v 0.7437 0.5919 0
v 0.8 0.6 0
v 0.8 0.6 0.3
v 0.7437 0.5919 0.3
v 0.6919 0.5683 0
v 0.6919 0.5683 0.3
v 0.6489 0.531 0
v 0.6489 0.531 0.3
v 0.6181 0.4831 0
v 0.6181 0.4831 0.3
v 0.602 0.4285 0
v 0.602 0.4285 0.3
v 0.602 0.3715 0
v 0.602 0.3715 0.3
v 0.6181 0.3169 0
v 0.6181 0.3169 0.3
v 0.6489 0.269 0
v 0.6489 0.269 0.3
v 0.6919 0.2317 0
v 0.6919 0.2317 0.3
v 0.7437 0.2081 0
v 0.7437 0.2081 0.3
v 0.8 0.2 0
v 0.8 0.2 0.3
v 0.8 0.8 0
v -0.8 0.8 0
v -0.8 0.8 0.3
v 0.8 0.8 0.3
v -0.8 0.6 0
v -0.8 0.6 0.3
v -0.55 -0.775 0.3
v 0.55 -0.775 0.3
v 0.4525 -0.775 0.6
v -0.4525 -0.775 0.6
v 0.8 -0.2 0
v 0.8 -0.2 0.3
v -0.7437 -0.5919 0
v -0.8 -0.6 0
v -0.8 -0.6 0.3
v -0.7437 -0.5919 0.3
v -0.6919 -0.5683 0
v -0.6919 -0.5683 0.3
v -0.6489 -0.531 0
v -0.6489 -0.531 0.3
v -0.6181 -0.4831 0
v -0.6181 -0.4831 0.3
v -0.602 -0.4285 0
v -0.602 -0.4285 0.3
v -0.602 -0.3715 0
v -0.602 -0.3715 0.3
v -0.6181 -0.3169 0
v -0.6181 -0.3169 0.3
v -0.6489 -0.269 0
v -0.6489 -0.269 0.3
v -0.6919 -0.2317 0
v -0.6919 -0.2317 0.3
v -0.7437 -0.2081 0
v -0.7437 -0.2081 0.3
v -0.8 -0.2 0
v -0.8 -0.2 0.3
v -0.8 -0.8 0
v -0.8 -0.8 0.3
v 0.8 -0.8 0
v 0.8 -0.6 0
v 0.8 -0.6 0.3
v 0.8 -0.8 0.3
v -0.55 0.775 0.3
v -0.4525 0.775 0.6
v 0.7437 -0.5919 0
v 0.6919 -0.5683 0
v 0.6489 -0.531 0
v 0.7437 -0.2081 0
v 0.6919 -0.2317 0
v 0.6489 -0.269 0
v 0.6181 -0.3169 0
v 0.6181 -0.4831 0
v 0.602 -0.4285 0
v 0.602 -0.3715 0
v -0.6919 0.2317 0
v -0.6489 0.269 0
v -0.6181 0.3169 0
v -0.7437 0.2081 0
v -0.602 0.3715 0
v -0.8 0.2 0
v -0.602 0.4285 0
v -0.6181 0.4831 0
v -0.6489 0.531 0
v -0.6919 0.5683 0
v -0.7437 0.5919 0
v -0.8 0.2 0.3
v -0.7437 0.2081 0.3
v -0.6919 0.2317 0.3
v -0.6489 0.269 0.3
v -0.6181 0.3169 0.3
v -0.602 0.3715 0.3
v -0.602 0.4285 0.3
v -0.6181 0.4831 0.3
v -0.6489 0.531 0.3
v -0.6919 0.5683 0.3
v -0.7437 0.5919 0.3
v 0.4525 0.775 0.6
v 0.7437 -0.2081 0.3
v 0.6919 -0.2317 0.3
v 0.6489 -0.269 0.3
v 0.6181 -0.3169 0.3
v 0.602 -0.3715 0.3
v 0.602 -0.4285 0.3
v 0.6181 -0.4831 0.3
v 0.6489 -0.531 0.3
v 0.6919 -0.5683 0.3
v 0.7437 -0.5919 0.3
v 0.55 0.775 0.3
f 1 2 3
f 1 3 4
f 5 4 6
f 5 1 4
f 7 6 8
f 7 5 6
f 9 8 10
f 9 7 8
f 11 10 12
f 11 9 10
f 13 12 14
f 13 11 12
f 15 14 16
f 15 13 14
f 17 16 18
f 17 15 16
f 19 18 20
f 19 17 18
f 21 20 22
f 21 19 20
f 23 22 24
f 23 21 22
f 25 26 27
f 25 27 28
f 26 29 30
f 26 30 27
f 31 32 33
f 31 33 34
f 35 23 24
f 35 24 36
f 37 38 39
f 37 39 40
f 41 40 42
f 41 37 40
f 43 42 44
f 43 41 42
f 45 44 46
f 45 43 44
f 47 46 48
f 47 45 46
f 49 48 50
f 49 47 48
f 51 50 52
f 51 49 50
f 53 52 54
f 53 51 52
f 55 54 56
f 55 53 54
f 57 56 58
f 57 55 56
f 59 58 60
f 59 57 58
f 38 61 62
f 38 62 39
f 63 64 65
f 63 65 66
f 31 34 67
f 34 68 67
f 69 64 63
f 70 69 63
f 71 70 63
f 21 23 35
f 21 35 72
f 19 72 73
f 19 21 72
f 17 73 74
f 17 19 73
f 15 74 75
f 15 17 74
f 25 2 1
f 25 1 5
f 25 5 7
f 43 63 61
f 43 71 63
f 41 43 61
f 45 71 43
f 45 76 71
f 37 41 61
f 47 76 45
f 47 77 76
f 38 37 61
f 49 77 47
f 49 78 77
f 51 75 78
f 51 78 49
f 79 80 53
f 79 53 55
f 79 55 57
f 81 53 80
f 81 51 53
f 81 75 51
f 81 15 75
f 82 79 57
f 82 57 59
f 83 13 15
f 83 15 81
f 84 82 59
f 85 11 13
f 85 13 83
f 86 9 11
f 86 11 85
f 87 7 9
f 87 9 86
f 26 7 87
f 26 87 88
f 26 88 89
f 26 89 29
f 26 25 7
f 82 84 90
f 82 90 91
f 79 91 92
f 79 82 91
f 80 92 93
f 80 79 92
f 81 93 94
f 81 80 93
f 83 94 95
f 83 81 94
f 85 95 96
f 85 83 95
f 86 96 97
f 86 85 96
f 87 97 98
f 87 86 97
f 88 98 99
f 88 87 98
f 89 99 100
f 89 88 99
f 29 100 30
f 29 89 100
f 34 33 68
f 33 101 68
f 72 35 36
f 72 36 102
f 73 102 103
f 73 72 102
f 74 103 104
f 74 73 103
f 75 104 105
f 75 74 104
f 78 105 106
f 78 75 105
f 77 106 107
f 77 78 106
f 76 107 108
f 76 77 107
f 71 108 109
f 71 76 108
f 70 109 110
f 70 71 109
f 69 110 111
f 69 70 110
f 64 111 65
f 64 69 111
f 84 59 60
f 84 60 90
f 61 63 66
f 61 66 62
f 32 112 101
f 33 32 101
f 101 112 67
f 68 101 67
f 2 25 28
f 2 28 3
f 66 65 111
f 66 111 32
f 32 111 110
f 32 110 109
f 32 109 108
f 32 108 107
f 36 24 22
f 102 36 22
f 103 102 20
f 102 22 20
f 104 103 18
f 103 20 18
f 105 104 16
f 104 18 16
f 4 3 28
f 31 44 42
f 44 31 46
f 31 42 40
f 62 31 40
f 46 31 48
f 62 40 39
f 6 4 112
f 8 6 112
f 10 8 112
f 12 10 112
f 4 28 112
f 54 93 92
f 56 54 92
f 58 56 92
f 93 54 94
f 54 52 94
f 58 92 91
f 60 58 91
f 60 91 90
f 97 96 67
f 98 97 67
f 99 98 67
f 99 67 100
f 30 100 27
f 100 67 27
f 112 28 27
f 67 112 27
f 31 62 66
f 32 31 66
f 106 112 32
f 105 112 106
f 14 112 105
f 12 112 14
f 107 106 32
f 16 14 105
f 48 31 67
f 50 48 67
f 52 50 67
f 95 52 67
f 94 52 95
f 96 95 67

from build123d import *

# Parameters (mm, degrees)
BOSS_EXTRUDE1_DEPTH = 0.3
BOSS_EXTRUDE2_DEPTH = 0.775


with BuildPart() as part:
    # Sketch2 → Boss-Extrude1 (new body)
    with BuildSketch(Plane.XY):
        with BuildLine():
            Line((-0.8, 0.8), (0.8, 0.8))
            Line((0.8, 0.8), (0.8, 0.6))
            ThreePointArc((0.8, 0.6), (0.6, 0.4), (0.8, 0.2))
            Line((0.8, 0.2), (0.8, -0.2))
            ThreePointArc((0.8, -0.2), (0.6, -0.4), (0.8, -0.6))
            Line((0.8, -0.6), (0.8, -0.8))
            Line((0.8, -0.8), (-0.8, -0.8))
            Line((-0.8, -0.8), (-0.8, -0.6))
            ThreePointArc((-0.8, -0.6), (-0.6, -0.4), (-0.8, -0.2))
            Line((-0.8, -0.2), (-0.8, 0.2))
            ThreePointArc((-0.8, 0.2), (-0.6, 0.4), (-0.8, 0.6))
            Line((-0.8, 0.6), (-0.8, 0.8))
        make_face()
    extrude(amount=BOSS_EXTRUDE1_DEPTH)

    # Sketch3 → Boss-Extrude2 (add, symmetric)
    with BuildSketch(Plane(origin=(0, 0, 0), x_dir=(1, 0, 0), z_dir=(0, 1, 0))):
        Polygon((0.55, -0.3), (0.452524091, -0.6), (-0.452524091, -0.6), (-0.55, -0.3), align=None)
    extrude(amount=BOSS_EXTRUDE2_DEPTH, both=True)


solid = part.part
